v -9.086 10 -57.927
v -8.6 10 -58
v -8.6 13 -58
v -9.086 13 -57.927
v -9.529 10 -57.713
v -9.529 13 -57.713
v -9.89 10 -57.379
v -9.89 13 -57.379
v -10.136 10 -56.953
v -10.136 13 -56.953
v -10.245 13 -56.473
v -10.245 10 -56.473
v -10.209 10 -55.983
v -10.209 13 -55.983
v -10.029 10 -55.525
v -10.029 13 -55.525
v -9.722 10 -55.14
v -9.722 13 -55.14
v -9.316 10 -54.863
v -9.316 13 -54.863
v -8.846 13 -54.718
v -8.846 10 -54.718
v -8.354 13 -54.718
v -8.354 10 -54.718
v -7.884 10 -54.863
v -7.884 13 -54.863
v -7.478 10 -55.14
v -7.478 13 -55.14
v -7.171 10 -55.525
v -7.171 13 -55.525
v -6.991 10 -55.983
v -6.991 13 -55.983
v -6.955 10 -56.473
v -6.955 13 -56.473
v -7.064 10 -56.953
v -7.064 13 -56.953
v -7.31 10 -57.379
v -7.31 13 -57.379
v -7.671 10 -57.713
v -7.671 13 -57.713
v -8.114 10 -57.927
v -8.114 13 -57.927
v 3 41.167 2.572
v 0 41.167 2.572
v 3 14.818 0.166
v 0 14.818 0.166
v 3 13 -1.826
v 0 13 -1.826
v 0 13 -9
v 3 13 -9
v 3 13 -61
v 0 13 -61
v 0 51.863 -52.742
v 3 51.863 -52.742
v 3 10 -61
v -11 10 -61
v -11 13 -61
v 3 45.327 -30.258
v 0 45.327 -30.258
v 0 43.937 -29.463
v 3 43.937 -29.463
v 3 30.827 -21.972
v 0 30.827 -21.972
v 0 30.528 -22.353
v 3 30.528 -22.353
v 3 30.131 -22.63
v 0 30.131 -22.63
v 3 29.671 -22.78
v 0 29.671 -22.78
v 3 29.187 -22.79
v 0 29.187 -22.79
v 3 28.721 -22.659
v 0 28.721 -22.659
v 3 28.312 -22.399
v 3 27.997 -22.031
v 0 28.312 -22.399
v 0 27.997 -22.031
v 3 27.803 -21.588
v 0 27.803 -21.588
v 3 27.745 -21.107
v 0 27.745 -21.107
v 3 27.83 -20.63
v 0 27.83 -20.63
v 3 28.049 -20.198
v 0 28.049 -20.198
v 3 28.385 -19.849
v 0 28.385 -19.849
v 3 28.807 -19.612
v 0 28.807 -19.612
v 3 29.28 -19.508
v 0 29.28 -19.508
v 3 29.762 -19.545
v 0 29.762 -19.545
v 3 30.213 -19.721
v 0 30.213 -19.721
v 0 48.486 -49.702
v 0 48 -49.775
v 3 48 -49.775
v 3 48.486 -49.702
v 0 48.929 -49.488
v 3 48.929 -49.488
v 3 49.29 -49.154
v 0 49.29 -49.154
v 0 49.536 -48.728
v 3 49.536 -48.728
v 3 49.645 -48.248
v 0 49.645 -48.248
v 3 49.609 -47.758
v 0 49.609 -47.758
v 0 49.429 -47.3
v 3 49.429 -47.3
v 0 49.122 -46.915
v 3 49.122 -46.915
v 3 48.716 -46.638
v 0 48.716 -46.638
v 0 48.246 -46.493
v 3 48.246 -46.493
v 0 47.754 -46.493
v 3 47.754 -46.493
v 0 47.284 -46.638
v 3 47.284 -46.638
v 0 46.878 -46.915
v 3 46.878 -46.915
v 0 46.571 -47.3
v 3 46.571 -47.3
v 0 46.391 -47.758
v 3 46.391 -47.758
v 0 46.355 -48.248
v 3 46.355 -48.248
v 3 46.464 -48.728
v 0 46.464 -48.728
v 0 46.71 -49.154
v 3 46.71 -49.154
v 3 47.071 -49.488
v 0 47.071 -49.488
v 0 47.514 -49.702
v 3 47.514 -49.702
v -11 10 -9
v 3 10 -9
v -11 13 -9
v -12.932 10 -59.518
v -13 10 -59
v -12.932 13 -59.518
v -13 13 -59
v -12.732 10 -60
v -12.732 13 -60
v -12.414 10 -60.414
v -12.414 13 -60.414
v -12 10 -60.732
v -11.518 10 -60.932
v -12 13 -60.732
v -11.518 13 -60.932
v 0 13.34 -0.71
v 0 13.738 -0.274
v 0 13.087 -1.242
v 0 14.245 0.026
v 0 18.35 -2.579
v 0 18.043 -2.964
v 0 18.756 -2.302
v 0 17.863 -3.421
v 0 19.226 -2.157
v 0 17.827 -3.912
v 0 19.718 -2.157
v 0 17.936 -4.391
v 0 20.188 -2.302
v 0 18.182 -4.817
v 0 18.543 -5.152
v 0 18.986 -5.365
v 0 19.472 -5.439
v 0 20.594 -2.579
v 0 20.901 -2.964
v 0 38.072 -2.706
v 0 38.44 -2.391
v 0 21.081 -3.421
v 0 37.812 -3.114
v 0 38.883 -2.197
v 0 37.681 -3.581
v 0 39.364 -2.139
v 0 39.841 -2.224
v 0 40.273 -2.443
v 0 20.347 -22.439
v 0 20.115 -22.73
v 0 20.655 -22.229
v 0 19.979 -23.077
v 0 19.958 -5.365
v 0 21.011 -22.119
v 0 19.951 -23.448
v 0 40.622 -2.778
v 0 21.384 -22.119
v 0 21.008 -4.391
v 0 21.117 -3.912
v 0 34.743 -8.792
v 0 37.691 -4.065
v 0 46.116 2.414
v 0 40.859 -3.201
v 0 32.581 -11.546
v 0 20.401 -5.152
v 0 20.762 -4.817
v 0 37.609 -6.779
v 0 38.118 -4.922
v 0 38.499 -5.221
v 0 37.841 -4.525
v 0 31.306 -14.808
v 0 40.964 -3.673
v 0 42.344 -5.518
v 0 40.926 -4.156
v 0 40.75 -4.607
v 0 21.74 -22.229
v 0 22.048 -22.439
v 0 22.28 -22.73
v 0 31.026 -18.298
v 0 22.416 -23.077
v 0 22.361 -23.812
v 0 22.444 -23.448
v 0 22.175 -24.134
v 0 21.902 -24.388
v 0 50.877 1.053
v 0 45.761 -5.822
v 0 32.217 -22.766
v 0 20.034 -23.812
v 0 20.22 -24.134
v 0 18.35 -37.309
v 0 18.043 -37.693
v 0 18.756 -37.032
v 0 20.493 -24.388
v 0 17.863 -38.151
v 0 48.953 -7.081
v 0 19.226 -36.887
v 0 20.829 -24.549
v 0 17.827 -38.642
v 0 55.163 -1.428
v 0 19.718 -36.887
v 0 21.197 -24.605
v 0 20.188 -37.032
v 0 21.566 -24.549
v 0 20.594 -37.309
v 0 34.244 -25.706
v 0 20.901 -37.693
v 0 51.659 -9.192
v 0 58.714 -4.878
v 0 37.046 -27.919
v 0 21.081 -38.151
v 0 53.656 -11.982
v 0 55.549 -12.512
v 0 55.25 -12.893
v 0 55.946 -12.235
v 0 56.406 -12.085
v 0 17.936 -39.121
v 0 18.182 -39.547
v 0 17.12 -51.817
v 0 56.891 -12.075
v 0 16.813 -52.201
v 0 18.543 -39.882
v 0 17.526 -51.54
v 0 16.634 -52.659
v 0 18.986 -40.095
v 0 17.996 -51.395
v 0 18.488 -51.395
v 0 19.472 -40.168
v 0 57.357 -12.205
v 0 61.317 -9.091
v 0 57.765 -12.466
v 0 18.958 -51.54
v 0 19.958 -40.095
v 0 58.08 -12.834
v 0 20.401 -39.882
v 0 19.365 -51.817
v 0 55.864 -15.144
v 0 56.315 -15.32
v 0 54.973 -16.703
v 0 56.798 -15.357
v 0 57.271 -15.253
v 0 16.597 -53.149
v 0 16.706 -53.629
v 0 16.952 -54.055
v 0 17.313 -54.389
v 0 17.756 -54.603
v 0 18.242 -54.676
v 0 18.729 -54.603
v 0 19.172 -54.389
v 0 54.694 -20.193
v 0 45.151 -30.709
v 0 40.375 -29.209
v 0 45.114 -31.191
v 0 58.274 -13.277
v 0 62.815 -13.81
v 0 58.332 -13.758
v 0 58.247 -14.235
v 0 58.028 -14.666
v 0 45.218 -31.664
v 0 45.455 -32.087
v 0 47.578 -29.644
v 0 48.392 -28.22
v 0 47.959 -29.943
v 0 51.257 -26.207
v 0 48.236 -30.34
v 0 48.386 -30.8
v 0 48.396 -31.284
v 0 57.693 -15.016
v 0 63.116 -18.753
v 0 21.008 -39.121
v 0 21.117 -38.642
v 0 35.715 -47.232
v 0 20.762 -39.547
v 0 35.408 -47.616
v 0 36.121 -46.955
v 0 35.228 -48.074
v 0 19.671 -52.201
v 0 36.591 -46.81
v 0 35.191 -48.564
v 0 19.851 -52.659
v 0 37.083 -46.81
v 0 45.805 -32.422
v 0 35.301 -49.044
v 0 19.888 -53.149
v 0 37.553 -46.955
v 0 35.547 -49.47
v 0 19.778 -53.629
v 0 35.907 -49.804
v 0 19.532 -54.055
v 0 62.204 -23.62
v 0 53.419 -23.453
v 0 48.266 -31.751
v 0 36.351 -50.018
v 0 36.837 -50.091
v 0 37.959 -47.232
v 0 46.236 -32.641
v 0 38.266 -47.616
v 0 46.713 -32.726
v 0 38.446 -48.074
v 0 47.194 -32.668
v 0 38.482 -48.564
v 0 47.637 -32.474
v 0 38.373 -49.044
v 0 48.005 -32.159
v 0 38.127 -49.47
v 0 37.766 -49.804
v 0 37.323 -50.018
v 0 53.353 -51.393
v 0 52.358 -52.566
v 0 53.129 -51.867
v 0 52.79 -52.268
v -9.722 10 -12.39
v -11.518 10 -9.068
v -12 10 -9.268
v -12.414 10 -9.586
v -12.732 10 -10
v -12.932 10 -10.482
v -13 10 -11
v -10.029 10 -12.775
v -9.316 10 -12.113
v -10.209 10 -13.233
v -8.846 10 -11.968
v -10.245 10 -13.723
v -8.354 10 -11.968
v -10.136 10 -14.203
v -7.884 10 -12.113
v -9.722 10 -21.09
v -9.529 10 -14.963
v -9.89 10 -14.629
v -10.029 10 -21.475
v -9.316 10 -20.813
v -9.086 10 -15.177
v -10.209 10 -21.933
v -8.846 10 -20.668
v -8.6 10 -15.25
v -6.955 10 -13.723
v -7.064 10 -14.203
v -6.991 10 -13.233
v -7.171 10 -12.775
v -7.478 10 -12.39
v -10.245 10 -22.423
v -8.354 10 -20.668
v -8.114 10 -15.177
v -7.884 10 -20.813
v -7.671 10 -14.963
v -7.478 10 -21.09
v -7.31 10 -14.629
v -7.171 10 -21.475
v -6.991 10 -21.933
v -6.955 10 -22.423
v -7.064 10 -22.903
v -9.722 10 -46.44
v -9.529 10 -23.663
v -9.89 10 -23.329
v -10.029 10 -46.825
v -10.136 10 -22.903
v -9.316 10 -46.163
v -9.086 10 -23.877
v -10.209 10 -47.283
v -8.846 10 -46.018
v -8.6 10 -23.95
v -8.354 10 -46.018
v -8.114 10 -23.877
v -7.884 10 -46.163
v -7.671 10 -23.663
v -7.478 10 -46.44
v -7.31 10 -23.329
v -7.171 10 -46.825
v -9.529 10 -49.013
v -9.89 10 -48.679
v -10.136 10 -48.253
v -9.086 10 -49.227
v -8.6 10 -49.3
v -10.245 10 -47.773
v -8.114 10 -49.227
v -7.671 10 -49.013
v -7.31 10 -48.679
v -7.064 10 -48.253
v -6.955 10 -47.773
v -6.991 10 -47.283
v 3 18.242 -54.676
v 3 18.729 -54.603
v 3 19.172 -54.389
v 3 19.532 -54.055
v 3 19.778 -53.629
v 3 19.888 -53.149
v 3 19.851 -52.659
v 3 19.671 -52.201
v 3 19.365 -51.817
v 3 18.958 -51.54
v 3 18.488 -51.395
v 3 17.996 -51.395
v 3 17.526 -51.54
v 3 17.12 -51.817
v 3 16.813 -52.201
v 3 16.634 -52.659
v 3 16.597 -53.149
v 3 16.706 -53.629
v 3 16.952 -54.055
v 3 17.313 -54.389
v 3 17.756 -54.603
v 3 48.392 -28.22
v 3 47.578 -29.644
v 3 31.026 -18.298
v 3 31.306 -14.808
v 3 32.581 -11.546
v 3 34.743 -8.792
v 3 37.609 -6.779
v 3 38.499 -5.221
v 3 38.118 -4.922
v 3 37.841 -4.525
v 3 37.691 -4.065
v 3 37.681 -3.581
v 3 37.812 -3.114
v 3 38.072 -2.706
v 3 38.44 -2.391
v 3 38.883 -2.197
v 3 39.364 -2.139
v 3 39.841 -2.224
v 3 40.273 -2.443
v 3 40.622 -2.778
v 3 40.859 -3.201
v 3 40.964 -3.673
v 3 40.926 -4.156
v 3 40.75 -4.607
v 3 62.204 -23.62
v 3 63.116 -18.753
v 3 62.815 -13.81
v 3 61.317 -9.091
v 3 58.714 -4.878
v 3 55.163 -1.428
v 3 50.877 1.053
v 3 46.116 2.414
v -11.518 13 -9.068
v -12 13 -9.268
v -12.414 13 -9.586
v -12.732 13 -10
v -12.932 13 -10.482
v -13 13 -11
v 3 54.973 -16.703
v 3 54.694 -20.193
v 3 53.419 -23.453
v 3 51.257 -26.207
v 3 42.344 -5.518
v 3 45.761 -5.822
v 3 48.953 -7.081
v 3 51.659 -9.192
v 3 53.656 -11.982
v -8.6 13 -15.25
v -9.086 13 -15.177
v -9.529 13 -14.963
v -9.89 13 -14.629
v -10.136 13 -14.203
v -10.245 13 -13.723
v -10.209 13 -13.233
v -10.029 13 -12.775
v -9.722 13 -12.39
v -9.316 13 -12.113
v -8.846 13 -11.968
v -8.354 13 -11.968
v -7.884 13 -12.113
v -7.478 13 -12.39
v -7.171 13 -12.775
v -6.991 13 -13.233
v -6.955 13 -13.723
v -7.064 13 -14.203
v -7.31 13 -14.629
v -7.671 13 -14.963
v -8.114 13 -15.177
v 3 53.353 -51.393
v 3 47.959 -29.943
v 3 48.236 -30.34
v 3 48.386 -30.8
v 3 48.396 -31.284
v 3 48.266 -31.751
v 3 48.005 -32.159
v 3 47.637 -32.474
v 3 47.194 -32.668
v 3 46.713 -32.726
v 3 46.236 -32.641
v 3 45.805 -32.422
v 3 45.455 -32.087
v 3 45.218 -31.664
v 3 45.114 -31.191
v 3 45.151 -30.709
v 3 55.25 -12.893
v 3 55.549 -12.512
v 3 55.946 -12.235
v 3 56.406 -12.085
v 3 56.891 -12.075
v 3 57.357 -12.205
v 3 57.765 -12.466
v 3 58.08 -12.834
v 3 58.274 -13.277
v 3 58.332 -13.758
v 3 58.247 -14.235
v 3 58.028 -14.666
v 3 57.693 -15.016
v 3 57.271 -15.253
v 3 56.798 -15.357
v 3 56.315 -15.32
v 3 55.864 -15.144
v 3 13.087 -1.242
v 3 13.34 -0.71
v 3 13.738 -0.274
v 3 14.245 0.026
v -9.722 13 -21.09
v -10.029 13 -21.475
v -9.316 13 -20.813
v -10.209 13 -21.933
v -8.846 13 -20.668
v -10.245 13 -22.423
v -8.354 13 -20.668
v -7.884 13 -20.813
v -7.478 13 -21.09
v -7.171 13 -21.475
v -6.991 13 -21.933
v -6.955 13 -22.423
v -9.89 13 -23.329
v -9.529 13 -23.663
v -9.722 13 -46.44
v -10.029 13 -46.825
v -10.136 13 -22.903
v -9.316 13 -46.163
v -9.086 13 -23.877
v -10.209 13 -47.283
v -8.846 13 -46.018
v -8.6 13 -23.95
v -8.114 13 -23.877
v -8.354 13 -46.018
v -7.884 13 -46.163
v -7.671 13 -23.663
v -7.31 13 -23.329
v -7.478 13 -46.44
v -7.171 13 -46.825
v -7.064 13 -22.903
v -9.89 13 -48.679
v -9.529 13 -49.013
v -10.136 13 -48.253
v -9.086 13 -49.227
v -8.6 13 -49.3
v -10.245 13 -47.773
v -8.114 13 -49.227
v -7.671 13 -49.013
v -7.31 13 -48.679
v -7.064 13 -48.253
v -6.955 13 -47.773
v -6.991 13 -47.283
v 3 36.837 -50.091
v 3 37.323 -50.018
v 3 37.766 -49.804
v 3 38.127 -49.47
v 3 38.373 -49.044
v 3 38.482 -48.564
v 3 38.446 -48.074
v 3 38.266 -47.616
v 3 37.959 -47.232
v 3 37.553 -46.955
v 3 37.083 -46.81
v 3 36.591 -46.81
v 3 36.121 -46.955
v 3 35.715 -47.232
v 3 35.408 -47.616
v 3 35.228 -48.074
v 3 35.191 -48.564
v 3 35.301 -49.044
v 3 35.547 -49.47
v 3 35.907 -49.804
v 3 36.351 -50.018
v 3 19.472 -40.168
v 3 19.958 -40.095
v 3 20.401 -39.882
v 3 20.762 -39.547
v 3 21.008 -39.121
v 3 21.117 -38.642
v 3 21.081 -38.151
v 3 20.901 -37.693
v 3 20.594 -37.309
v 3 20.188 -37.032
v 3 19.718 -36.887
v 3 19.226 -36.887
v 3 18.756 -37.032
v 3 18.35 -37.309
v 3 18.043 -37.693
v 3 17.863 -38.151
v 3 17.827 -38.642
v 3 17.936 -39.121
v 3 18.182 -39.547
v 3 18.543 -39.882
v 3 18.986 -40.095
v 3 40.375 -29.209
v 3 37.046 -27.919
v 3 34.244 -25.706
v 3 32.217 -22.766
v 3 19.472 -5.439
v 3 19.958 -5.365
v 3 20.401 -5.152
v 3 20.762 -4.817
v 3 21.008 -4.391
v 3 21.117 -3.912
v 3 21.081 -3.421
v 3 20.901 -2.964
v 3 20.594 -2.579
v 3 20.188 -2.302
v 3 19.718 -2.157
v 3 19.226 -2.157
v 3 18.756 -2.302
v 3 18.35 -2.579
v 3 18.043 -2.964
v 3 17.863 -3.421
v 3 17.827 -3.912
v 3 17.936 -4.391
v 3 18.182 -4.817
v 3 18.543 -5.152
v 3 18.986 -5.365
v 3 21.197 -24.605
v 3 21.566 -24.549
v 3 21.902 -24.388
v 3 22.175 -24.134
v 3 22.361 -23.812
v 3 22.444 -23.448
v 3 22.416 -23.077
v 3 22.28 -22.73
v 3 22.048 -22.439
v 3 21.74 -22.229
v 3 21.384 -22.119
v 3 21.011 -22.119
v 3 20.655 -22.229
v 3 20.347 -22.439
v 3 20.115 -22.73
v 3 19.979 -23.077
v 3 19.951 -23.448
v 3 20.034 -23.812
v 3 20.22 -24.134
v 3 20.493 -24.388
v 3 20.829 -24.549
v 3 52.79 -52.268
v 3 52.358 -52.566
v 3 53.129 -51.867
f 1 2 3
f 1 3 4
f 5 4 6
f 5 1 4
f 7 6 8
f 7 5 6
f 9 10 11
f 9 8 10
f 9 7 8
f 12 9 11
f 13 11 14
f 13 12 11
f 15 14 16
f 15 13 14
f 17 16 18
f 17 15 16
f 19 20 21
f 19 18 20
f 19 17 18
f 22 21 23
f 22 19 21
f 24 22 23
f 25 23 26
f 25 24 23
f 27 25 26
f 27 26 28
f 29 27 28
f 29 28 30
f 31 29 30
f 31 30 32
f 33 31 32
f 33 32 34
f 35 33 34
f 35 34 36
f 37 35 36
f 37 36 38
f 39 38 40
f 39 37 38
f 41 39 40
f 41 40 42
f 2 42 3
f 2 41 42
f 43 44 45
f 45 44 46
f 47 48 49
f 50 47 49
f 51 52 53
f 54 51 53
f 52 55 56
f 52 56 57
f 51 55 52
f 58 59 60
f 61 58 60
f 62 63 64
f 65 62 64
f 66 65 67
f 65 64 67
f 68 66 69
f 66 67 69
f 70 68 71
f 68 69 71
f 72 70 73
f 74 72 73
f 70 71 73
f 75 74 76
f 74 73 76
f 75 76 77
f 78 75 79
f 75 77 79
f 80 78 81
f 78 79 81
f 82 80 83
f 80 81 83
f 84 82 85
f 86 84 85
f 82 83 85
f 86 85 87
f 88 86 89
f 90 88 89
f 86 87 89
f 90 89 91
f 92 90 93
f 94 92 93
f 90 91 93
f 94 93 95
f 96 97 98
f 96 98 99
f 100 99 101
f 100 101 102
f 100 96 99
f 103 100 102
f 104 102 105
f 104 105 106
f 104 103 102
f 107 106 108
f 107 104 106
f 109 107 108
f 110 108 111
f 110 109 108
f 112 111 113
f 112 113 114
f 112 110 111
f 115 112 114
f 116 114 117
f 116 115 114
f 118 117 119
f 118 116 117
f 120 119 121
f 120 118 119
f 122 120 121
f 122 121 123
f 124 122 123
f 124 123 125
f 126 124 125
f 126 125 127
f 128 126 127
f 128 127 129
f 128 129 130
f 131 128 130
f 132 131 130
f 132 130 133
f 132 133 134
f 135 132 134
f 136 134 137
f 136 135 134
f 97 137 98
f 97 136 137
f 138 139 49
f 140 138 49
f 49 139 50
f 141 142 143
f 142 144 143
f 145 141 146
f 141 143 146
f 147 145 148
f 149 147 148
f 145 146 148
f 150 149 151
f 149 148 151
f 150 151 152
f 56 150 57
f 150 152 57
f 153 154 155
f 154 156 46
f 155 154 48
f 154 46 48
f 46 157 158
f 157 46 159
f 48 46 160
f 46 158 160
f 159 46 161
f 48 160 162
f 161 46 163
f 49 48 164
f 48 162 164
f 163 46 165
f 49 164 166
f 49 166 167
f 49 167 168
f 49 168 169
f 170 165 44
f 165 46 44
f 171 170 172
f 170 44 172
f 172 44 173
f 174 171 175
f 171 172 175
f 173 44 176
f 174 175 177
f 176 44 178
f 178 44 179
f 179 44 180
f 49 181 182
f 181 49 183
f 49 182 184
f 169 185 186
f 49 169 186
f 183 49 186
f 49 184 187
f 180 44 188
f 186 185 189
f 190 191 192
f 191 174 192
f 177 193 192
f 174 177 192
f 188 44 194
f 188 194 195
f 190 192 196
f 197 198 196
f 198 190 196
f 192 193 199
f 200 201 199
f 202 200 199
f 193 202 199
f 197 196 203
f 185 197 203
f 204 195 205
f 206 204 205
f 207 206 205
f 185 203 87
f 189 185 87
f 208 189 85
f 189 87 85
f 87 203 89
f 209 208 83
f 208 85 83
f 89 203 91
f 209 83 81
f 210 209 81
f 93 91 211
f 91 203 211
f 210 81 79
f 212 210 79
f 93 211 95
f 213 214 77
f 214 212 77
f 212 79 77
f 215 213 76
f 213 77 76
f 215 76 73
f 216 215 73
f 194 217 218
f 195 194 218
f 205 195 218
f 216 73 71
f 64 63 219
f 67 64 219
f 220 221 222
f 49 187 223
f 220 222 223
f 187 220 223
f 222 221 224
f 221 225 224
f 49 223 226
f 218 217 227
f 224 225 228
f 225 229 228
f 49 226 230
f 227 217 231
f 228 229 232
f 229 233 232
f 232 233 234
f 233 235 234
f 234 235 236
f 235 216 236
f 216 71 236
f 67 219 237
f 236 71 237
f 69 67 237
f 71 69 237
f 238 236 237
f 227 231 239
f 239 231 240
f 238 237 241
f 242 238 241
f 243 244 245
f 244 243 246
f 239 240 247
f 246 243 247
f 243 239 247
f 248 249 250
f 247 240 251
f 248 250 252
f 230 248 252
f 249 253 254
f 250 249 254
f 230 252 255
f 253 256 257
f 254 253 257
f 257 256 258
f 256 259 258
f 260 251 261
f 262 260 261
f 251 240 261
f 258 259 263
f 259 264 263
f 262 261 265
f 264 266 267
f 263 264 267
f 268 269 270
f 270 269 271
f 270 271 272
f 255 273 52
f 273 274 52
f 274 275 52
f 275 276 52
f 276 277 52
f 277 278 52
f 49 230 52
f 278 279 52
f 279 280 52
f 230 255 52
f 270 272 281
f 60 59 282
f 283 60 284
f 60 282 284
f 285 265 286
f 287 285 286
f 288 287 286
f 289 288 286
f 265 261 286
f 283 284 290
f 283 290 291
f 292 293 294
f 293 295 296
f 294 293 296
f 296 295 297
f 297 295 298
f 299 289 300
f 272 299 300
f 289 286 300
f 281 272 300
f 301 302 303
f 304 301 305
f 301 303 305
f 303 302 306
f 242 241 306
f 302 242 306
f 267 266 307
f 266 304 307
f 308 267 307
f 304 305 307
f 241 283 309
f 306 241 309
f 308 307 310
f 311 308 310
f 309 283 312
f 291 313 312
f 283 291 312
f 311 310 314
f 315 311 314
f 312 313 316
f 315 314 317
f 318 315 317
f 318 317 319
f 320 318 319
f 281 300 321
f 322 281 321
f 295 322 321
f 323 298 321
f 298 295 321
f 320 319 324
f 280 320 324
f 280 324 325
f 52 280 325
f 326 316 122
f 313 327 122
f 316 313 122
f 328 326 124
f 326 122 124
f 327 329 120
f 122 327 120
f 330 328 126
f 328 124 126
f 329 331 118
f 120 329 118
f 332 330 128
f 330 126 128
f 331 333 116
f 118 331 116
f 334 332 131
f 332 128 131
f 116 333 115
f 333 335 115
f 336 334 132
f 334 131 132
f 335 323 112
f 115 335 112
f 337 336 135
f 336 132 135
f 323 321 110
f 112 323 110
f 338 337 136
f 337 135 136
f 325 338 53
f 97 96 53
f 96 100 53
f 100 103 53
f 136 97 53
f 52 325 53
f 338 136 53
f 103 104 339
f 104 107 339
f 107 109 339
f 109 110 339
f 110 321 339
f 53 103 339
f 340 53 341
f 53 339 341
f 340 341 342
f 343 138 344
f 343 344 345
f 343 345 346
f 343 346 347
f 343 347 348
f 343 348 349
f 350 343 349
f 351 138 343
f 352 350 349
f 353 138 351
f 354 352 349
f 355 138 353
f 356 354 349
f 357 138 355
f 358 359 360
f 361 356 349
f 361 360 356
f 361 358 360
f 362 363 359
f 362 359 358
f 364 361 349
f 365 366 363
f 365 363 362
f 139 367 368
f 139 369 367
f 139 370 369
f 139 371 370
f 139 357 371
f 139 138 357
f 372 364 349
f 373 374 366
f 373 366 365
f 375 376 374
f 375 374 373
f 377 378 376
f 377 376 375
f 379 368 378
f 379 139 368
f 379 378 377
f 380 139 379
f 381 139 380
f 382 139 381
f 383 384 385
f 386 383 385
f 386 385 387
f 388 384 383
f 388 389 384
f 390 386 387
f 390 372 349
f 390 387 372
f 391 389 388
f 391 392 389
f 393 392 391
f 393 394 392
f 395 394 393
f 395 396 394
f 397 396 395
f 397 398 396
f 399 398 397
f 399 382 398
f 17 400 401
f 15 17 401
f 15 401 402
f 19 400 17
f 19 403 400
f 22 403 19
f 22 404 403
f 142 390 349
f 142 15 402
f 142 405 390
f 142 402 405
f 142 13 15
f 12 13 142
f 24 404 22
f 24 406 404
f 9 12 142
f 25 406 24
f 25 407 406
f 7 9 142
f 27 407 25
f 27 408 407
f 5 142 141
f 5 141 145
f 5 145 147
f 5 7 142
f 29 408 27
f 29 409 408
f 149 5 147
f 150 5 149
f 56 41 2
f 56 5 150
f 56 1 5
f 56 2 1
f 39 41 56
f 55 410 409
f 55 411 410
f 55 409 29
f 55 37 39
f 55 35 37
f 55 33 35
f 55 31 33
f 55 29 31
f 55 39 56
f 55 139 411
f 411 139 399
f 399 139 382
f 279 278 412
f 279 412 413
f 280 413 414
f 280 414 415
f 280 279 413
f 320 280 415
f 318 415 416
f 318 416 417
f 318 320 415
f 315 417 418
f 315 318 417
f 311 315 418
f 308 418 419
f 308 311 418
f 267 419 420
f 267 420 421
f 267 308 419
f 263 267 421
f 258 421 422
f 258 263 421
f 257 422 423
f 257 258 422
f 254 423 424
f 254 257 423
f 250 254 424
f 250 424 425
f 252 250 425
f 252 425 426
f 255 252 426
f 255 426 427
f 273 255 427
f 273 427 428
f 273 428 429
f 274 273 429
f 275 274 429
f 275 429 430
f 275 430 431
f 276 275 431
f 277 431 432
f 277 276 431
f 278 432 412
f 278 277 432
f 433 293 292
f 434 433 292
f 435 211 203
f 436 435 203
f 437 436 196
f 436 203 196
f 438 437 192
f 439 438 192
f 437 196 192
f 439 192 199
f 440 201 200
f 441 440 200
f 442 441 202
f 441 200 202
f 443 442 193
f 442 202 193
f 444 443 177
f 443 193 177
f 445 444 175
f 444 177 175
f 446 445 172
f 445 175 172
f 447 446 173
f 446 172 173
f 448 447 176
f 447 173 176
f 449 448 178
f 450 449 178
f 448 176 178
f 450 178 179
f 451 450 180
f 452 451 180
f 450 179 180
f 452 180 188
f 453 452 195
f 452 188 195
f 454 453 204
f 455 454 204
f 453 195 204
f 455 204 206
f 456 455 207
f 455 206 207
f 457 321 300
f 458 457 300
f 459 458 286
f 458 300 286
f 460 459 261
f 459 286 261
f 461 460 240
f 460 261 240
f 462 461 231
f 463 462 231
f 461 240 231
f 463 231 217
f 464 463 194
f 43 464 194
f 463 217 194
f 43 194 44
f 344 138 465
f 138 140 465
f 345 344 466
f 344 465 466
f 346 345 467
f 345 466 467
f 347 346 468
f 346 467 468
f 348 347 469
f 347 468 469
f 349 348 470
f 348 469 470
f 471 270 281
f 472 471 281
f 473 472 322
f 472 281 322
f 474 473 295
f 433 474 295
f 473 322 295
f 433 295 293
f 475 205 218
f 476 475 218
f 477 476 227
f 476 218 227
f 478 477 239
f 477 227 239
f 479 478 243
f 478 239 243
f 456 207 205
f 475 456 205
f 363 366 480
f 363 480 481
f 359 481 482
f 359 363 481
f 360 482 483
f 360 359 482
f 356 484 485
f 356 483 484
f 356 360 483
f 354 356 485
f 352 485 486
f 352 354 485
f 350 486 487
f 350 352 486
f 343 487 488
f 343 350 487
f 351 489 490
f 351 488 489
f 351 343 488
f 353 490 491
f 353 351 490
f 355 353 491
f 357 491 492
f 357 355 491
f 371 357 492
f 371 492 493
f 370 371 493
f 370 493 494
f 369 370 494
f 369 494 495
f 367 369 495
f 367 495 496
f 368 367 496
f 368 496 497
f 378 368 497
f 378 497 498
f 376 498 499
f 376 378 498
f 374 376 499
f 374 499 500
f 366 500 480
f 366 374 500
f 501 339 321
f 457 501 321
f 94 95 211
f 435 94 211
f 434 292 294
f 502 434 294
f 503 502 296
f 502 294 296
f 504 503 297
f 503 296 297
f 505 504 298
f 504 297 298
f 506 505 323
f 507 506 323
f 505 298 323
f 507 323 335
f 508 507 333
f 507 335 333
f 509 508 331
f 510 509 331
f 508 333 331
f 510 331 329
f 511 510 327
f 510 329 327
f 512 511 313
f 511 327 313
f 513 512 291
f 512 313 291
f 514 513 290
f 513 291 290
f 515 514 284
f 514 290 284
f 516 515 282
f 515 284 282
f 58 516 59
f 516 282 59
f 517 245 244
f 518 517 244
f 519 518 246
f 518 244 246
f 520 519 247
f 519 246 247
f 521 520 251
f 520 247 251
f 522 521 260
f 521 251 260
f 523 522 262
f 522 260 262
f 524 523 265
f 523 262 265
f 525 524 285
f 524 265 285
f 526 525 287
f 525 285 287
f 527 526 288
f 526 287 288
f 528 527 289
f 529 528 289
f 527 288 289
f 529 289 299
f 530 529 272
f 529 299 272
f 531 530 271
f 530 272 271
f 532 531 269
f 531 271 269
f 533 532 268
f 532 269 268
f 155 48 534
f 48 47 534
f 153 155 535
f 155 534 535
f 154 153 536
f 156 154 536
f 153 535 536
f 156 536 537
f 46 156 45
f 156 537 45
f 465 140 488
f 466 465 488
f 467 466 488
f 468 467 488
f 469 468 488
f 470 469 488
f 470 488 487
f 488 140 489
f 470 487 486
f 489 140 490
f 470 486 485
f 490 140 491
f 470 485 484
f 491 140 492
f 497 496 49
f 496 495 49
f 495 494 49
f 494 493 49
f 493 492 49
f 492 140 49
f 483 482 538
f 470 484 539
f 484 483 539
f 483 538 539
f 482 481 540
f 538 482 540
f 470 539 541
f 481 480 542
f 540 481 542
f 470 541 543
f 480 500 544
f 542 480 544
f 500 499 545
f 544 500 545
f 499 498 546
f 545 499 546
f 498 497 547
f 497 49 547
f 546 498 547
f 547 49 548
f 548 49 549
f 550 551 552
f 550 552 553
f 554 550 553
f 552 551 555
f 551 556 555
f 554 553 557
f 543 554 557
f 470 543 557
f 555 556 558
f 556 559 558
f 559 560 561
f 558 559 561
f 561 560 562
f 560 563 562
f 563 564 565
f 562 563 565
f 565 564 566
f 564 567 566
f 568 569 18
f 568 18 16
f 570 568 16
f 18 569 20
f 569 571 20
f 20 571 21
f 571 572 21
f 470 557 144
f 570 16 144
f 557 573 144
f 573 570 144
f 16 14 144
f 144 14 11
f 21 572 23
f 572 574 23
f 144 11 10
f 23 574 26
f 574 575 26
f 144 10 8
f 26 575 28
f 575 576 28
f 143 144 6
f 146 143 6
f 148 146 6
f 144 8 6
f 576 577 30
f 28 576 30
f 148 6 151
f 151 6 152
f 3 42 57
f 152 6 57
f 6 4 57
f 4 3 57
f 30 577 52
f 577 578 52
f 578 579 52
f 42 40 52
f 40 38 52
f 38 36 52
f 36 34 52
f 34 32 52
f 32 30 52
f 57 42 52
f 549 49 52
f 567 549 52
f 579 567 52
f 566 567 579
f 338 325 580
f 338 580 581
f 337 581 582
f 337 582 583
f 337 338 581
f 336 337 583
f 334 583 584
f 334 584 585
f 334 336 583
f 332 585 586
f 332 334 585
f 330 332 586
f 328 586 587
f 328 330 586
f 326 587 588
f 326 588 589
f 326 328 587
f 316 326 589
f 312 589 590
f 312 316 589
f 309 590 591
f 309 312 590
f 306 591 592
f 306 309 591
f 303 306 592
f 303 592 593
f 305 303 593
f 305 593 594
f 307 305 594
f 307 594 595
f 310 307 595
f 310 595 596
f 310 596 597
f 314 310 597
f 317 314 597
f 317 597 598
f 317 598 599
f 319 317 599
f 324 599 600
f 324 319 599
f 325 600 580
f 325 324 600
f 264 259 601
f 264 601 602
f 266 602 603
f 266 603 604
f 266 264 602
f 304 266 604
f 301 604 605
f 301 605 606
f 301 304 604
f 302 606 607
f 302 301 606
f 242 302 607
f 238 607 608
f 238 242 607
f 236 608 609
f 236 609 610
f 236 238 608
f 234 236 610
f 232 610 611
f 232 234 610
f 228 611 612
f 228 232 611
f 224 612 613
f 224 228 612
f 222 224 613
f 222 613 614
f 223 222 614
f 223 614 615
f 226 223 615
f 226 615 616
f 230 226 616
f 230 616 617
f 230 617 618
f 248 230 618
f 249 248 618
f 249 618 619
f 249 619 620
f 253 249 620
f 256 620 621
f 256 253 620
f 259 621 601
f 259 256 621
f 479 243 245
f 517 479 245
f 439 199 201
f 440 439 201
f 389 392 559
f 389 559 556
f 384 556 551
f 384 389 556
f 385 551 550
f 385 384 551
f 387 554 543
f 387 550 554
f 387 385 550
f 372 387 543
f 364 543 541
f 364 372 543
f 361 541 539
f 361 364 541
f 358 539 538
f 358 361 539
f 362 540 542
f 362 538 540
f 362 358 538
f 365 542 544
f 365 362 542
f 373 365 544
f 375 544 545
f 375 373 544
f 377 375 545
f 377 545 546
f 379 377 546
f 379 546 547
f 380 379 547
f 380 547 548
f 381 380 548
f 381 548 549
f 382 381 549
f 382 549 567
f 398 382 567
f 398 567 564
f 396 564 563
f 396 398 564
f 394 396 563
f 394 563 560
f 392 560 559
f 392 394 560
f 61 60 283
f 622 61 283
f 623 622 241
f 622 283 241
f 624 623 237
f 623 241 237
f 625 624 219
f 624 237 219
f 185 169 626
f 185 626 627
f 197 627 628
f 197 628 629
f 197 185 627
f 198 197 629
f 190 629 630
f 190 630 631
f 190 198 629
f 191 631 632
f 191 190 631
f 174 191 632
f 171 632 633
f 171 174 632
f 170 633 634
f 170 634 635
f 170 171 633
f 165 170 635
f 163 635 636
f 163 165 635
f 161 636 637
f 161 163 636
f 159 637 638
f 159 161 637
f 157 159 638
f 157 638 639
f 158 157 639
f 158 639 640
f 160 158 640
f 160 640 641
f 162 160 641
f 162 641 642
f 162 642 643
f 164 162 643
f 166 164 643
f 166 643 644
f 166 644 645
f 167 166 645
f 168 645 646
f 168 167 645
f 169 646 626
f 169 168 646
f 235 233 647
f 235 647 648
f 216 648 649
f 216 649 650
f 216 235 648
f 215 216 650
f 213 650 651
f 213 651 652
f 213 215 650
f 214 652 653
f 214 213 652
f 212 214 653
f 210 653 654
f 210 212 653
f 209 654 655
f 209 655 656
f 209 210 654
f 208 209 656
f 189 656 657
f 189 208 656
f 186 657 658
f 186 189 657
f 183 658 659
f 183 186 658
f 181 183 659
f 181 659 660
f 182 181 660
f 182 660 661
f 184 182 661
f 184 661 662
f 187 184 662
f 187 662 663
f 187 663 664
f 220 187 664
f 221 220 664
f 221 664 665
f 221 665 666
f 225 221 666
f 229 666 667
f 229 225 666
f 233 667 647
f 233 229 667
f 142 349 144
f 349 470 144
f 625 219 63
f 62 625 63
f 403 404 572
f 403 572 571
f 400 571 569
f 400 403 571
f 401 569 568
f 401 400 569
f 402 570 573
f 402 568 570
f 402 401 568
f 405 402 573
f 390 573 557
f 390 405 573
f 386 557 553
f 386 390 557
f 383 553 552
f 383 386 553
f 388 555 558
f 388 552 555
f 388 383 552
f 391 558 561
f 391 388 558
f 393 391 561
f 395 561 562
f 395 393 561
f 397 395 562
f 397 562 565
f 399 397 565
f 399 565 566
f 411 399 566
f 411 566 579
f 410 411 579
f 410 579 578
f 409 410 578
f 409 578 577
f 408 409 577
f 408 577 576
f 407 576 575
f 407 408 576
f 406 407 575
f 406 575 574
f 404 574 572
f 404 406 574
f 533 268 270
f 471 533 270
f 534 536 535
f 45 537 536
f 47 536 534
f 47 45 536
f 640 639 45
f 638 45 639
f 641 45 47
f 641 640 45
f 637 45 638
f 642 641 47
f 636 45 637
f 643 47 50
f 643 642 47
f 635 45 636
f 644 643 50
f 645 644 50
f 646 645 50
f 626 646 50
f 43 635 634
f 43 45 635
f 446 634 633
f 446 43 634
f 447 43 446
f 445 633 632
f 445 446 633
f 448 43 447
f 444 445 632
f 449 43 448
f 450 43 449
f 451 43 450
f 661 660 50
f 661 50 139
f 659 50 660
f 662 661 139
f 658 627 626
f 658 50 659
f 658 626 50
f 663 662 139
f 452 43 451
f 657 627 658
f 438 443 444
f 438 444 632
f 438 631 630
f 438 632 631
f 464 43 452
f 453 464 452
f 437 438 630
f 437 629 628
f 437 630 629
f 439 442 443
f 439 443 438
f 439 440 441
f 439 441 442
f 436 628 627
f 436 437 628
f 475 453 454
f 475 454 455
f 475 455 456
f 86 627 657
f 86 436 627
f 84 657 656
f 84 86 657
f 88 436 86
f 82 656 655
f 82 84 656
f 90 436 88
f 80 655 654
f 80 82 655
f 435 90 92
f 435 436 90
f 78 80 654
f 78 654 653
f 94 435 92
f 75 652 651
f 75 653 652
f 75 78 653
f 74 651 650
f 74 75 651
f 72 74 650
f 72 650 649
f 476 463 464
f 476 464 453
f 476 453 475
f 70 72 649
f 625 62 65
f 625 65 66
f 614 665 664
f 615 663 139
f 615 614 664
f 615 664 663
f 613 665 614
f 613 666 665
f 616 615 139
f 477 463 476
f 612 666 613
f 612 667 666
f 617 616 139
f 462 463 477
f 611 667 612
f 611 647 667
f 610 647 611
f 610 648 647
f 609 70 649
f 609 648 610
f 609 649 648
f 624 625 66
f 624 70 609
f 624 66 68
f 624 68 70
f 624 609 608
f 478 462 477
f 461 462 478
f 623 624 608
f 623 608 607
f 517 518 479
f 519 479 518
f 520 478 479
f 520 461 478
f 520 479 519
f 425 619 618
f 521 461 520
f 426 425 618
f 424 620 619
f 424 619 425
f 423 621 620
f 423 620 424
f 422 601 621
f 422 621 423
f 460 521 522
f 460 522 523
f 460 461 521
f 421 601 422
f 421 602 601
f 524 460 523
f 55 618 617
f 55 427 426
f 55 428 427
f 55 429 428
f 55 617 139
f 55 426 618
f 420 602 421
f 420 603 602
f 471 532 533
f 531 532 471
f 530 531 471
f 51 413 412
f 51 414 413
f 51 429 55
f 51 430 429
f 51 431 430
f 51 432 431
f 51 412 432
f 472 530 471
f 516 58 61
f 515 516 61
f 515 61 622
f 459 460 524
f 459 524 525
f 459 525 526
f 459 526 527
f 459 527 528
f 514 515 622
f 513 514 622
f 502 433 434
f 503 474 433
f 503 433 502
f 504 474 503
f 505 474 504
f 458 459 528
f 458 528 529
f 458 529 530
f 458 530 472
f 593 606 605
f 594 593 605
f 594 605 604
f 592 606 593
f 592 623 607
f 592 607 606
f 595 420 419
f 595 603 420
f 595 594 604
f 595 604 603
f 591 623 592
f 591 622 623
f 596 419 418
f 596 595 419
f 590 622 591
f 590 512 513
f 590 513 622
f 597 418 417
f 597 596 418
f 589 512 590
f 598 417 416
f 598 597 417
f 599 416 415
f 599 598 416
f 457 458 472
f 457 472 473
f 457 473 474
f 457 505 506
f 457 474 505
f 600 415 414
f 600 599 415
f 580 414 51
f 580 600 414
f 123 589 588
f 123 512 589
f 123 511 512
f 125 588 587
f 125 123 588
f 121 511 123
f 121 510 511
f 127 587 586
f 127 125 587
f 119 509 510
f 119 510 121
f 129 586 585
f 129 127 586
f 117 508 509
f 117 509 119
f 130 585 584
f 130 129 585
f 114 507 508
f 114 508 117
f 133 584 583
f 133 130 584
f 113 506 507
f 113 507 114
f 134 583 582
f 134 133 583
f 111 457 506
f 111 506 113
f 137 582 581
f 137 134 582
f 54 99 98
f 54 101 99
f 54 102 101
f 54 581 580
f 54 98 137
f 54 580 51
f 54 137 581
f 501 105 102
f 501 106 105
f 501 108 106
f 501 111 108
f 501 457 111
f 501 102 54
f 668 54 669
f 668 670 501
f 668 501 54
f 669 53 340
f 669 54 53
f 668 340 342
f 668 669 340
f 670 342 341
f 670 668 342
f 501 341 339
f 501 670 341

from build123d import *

# Parameters (mm, degrees)
SKETCH_1_R               = 1.65
SKETCH_1_R_2             = 1.25
EXTRUDE_4_DEPTH          = 3
SKETCH_4_W               = 52
SKETCH_4_H               = 3
EXTRUDE_6_DEPTH          = 16
CUT_EXTRUDE_1_DEPTH      = 81.034703796
CUT_EXTRUDE_1_DEPTH_BACK = 22
SKETCH_3_R               = 1.65
FILLET_1_R               = 2


with BuildPart() as part:
    # 草图1 → 凸台-拉伸4 (new body)
    with BuildSketch(Plane(origin=(0, 0, 0), x_dir=(0, 0, -1), z_dir=(1, 0, 0))):
        with BuildLine():
            Line((61, 13), (52.5, 53))
            Line((52.5, 53), (23.619851789, 62.203688194))
            ThreePointArc((23.619851789, 62.203688194), (4.878186687, 58.71413126), (-2.572313303, 41.16656538))
            Line((-2.572313303, 41.16656538), (0, 13))
            Line((0, 13), (61, 13))
        make_face()
        with BuildLine():
            Line((28.220139039, 48.391717332), (29.643651042, 47.578281902))
            ThreePointArc((29.643651042, 47.578281902), (32.668112531, 47.193796374), (30.257622978, 45.32705147))
            Line((30.257622978, 45.32705147), (29.463156964, 43.936735946))
            ThreePointArc((29.463156964, 43.936735946), (27.918719173, 37.045985315), (22.766171662, 32.217011666))
            Line((22.766171662, 32.217011666), (21.972102707, 30.827390996))
            ThreePointArc((21.972102707, 30.827390996), (21.587617178, 27.802929507), (19.720872274, 30.21341906))
            Line((19.720872274, 30.21341906), (18.298407802, 31.026255901))
            ThreePointArc((18.298407802, 31.026255901), (11.546134207, 32.58073487), (6.778813424, 37.60888126))
            Line((6.778813424, 37.60888126), (5.221211801, 38.49893933))
            ThreePointArc((5.221211801, 38.49893933), (2.196750311, 38.883424859), (4.607239865, 40.750169763))
            Line((4.607239865, 40.750169763), (5.51775044, 42.34356327))
            ThreePointArc((5.51775044, 42.34356327), (7.080883762, 48.953319836), (11.981852501, 53.655741877))
            Line((11.981852501, 53.655741877), (12.892760135, 55.249830237))
            ThreePointArc((12.892760135, 55.249830237), (13.277245664, 58.274291726), (15.143990568, 55.863802173))
            Line((15.143990568, 55.863802173), (16.702639721, 54.973145514))
            ThreePointArc((16.702639721, 54.973145514), (23.453468727, 53.418570281), (28.220139039, 48.391717332))
        make_face(mode=Mode.SUBTRACT)
        with Locations((48.441115069, 36.836873887)):
            Circle(SKETCH_1_R, mode=Mode.SUBTRACT)
        with Locations((38.518336301, 19.472011044)):
            Circle(SKETCH_1_R, mode=Mode.SUBTRACT)
        with Locations((53.026104064, 18.242284788)):
            Circle(SKETCH_1_R, mode=Mode.SUBTRACT)
        with Locations((48.125, 48)):
            Circle(SKETCH_1_R, mode=Mode.SUBTRACT)
        with Locations((3.788610616, 19.472011044)):
            Circle(SKETCH_1_R, mode=Mode.SUBTRACT)
        with Locations((23.354935737, 21.197394906)):
            Circle(SKETCH_1_R_2, mode=Mode.SUBTRACT)
    extrude(amount=EXTRUDE_4_DEPTH)

    # 草图4 → 凸台-拉伸6 (add)
    with BuildSketch(Plane(origin=(3, 0, 0), x_dir=(0, 0, -1), z_dir=(1, 0, 0))):
        with Locations((35, 11.5)):
            Rectangle(SKETCH_4_W, SKETCH_4_H)
    extrude(amount=-EXTRUDE_6_DEPTH)

    # 草图3 → 切除-拉伸1 (cut, two sides: drawn at the far end of the back side and taken through both)
    with BuildSketch(Plane(origin=(0, 13, 0), x_dir=(1, 0, 0), z_dir=(0, 1, 0)).offset(-CUT_EXTRUDE_1_DEPTH_BACK)):
        with Locations(Location((-8.6, 56.35, 0), (0, 0, 90))):
            Circle(SKETCH_3_R)
        with Locations(Location((-8.6, 47.65, 0), (0, 0, 90))):
            Circle(SKETCH_3_R)
        with Locations(Location((-8.6, 22.3, 0), (0, 0, 90))):
            Circle(SKETCH_3_R)
        with Locations(Location((-8.6, 13.6, 0), (0, 0, 90))):
            Circle(SKETCH_3_R)
    extrude(amount=CUT_EXTRUDE_1_DEPTH + CUT_EXTRUDE_1_DEPTH_BACK, mode=Mode.SUBTRACT)

    # 圆角1
    fillet_1_edges = [part.edges().sort_by_distance(p)[0] for p in [
        (1.5, 13, 0),
        (-13, 11.5, -9),
        (-13, 11.5, -61),
        (1.5, 53, -52.5),
    ]]
    fillet(fillet_1_edges, radius=FILLET_1_R)


solid = part.part
